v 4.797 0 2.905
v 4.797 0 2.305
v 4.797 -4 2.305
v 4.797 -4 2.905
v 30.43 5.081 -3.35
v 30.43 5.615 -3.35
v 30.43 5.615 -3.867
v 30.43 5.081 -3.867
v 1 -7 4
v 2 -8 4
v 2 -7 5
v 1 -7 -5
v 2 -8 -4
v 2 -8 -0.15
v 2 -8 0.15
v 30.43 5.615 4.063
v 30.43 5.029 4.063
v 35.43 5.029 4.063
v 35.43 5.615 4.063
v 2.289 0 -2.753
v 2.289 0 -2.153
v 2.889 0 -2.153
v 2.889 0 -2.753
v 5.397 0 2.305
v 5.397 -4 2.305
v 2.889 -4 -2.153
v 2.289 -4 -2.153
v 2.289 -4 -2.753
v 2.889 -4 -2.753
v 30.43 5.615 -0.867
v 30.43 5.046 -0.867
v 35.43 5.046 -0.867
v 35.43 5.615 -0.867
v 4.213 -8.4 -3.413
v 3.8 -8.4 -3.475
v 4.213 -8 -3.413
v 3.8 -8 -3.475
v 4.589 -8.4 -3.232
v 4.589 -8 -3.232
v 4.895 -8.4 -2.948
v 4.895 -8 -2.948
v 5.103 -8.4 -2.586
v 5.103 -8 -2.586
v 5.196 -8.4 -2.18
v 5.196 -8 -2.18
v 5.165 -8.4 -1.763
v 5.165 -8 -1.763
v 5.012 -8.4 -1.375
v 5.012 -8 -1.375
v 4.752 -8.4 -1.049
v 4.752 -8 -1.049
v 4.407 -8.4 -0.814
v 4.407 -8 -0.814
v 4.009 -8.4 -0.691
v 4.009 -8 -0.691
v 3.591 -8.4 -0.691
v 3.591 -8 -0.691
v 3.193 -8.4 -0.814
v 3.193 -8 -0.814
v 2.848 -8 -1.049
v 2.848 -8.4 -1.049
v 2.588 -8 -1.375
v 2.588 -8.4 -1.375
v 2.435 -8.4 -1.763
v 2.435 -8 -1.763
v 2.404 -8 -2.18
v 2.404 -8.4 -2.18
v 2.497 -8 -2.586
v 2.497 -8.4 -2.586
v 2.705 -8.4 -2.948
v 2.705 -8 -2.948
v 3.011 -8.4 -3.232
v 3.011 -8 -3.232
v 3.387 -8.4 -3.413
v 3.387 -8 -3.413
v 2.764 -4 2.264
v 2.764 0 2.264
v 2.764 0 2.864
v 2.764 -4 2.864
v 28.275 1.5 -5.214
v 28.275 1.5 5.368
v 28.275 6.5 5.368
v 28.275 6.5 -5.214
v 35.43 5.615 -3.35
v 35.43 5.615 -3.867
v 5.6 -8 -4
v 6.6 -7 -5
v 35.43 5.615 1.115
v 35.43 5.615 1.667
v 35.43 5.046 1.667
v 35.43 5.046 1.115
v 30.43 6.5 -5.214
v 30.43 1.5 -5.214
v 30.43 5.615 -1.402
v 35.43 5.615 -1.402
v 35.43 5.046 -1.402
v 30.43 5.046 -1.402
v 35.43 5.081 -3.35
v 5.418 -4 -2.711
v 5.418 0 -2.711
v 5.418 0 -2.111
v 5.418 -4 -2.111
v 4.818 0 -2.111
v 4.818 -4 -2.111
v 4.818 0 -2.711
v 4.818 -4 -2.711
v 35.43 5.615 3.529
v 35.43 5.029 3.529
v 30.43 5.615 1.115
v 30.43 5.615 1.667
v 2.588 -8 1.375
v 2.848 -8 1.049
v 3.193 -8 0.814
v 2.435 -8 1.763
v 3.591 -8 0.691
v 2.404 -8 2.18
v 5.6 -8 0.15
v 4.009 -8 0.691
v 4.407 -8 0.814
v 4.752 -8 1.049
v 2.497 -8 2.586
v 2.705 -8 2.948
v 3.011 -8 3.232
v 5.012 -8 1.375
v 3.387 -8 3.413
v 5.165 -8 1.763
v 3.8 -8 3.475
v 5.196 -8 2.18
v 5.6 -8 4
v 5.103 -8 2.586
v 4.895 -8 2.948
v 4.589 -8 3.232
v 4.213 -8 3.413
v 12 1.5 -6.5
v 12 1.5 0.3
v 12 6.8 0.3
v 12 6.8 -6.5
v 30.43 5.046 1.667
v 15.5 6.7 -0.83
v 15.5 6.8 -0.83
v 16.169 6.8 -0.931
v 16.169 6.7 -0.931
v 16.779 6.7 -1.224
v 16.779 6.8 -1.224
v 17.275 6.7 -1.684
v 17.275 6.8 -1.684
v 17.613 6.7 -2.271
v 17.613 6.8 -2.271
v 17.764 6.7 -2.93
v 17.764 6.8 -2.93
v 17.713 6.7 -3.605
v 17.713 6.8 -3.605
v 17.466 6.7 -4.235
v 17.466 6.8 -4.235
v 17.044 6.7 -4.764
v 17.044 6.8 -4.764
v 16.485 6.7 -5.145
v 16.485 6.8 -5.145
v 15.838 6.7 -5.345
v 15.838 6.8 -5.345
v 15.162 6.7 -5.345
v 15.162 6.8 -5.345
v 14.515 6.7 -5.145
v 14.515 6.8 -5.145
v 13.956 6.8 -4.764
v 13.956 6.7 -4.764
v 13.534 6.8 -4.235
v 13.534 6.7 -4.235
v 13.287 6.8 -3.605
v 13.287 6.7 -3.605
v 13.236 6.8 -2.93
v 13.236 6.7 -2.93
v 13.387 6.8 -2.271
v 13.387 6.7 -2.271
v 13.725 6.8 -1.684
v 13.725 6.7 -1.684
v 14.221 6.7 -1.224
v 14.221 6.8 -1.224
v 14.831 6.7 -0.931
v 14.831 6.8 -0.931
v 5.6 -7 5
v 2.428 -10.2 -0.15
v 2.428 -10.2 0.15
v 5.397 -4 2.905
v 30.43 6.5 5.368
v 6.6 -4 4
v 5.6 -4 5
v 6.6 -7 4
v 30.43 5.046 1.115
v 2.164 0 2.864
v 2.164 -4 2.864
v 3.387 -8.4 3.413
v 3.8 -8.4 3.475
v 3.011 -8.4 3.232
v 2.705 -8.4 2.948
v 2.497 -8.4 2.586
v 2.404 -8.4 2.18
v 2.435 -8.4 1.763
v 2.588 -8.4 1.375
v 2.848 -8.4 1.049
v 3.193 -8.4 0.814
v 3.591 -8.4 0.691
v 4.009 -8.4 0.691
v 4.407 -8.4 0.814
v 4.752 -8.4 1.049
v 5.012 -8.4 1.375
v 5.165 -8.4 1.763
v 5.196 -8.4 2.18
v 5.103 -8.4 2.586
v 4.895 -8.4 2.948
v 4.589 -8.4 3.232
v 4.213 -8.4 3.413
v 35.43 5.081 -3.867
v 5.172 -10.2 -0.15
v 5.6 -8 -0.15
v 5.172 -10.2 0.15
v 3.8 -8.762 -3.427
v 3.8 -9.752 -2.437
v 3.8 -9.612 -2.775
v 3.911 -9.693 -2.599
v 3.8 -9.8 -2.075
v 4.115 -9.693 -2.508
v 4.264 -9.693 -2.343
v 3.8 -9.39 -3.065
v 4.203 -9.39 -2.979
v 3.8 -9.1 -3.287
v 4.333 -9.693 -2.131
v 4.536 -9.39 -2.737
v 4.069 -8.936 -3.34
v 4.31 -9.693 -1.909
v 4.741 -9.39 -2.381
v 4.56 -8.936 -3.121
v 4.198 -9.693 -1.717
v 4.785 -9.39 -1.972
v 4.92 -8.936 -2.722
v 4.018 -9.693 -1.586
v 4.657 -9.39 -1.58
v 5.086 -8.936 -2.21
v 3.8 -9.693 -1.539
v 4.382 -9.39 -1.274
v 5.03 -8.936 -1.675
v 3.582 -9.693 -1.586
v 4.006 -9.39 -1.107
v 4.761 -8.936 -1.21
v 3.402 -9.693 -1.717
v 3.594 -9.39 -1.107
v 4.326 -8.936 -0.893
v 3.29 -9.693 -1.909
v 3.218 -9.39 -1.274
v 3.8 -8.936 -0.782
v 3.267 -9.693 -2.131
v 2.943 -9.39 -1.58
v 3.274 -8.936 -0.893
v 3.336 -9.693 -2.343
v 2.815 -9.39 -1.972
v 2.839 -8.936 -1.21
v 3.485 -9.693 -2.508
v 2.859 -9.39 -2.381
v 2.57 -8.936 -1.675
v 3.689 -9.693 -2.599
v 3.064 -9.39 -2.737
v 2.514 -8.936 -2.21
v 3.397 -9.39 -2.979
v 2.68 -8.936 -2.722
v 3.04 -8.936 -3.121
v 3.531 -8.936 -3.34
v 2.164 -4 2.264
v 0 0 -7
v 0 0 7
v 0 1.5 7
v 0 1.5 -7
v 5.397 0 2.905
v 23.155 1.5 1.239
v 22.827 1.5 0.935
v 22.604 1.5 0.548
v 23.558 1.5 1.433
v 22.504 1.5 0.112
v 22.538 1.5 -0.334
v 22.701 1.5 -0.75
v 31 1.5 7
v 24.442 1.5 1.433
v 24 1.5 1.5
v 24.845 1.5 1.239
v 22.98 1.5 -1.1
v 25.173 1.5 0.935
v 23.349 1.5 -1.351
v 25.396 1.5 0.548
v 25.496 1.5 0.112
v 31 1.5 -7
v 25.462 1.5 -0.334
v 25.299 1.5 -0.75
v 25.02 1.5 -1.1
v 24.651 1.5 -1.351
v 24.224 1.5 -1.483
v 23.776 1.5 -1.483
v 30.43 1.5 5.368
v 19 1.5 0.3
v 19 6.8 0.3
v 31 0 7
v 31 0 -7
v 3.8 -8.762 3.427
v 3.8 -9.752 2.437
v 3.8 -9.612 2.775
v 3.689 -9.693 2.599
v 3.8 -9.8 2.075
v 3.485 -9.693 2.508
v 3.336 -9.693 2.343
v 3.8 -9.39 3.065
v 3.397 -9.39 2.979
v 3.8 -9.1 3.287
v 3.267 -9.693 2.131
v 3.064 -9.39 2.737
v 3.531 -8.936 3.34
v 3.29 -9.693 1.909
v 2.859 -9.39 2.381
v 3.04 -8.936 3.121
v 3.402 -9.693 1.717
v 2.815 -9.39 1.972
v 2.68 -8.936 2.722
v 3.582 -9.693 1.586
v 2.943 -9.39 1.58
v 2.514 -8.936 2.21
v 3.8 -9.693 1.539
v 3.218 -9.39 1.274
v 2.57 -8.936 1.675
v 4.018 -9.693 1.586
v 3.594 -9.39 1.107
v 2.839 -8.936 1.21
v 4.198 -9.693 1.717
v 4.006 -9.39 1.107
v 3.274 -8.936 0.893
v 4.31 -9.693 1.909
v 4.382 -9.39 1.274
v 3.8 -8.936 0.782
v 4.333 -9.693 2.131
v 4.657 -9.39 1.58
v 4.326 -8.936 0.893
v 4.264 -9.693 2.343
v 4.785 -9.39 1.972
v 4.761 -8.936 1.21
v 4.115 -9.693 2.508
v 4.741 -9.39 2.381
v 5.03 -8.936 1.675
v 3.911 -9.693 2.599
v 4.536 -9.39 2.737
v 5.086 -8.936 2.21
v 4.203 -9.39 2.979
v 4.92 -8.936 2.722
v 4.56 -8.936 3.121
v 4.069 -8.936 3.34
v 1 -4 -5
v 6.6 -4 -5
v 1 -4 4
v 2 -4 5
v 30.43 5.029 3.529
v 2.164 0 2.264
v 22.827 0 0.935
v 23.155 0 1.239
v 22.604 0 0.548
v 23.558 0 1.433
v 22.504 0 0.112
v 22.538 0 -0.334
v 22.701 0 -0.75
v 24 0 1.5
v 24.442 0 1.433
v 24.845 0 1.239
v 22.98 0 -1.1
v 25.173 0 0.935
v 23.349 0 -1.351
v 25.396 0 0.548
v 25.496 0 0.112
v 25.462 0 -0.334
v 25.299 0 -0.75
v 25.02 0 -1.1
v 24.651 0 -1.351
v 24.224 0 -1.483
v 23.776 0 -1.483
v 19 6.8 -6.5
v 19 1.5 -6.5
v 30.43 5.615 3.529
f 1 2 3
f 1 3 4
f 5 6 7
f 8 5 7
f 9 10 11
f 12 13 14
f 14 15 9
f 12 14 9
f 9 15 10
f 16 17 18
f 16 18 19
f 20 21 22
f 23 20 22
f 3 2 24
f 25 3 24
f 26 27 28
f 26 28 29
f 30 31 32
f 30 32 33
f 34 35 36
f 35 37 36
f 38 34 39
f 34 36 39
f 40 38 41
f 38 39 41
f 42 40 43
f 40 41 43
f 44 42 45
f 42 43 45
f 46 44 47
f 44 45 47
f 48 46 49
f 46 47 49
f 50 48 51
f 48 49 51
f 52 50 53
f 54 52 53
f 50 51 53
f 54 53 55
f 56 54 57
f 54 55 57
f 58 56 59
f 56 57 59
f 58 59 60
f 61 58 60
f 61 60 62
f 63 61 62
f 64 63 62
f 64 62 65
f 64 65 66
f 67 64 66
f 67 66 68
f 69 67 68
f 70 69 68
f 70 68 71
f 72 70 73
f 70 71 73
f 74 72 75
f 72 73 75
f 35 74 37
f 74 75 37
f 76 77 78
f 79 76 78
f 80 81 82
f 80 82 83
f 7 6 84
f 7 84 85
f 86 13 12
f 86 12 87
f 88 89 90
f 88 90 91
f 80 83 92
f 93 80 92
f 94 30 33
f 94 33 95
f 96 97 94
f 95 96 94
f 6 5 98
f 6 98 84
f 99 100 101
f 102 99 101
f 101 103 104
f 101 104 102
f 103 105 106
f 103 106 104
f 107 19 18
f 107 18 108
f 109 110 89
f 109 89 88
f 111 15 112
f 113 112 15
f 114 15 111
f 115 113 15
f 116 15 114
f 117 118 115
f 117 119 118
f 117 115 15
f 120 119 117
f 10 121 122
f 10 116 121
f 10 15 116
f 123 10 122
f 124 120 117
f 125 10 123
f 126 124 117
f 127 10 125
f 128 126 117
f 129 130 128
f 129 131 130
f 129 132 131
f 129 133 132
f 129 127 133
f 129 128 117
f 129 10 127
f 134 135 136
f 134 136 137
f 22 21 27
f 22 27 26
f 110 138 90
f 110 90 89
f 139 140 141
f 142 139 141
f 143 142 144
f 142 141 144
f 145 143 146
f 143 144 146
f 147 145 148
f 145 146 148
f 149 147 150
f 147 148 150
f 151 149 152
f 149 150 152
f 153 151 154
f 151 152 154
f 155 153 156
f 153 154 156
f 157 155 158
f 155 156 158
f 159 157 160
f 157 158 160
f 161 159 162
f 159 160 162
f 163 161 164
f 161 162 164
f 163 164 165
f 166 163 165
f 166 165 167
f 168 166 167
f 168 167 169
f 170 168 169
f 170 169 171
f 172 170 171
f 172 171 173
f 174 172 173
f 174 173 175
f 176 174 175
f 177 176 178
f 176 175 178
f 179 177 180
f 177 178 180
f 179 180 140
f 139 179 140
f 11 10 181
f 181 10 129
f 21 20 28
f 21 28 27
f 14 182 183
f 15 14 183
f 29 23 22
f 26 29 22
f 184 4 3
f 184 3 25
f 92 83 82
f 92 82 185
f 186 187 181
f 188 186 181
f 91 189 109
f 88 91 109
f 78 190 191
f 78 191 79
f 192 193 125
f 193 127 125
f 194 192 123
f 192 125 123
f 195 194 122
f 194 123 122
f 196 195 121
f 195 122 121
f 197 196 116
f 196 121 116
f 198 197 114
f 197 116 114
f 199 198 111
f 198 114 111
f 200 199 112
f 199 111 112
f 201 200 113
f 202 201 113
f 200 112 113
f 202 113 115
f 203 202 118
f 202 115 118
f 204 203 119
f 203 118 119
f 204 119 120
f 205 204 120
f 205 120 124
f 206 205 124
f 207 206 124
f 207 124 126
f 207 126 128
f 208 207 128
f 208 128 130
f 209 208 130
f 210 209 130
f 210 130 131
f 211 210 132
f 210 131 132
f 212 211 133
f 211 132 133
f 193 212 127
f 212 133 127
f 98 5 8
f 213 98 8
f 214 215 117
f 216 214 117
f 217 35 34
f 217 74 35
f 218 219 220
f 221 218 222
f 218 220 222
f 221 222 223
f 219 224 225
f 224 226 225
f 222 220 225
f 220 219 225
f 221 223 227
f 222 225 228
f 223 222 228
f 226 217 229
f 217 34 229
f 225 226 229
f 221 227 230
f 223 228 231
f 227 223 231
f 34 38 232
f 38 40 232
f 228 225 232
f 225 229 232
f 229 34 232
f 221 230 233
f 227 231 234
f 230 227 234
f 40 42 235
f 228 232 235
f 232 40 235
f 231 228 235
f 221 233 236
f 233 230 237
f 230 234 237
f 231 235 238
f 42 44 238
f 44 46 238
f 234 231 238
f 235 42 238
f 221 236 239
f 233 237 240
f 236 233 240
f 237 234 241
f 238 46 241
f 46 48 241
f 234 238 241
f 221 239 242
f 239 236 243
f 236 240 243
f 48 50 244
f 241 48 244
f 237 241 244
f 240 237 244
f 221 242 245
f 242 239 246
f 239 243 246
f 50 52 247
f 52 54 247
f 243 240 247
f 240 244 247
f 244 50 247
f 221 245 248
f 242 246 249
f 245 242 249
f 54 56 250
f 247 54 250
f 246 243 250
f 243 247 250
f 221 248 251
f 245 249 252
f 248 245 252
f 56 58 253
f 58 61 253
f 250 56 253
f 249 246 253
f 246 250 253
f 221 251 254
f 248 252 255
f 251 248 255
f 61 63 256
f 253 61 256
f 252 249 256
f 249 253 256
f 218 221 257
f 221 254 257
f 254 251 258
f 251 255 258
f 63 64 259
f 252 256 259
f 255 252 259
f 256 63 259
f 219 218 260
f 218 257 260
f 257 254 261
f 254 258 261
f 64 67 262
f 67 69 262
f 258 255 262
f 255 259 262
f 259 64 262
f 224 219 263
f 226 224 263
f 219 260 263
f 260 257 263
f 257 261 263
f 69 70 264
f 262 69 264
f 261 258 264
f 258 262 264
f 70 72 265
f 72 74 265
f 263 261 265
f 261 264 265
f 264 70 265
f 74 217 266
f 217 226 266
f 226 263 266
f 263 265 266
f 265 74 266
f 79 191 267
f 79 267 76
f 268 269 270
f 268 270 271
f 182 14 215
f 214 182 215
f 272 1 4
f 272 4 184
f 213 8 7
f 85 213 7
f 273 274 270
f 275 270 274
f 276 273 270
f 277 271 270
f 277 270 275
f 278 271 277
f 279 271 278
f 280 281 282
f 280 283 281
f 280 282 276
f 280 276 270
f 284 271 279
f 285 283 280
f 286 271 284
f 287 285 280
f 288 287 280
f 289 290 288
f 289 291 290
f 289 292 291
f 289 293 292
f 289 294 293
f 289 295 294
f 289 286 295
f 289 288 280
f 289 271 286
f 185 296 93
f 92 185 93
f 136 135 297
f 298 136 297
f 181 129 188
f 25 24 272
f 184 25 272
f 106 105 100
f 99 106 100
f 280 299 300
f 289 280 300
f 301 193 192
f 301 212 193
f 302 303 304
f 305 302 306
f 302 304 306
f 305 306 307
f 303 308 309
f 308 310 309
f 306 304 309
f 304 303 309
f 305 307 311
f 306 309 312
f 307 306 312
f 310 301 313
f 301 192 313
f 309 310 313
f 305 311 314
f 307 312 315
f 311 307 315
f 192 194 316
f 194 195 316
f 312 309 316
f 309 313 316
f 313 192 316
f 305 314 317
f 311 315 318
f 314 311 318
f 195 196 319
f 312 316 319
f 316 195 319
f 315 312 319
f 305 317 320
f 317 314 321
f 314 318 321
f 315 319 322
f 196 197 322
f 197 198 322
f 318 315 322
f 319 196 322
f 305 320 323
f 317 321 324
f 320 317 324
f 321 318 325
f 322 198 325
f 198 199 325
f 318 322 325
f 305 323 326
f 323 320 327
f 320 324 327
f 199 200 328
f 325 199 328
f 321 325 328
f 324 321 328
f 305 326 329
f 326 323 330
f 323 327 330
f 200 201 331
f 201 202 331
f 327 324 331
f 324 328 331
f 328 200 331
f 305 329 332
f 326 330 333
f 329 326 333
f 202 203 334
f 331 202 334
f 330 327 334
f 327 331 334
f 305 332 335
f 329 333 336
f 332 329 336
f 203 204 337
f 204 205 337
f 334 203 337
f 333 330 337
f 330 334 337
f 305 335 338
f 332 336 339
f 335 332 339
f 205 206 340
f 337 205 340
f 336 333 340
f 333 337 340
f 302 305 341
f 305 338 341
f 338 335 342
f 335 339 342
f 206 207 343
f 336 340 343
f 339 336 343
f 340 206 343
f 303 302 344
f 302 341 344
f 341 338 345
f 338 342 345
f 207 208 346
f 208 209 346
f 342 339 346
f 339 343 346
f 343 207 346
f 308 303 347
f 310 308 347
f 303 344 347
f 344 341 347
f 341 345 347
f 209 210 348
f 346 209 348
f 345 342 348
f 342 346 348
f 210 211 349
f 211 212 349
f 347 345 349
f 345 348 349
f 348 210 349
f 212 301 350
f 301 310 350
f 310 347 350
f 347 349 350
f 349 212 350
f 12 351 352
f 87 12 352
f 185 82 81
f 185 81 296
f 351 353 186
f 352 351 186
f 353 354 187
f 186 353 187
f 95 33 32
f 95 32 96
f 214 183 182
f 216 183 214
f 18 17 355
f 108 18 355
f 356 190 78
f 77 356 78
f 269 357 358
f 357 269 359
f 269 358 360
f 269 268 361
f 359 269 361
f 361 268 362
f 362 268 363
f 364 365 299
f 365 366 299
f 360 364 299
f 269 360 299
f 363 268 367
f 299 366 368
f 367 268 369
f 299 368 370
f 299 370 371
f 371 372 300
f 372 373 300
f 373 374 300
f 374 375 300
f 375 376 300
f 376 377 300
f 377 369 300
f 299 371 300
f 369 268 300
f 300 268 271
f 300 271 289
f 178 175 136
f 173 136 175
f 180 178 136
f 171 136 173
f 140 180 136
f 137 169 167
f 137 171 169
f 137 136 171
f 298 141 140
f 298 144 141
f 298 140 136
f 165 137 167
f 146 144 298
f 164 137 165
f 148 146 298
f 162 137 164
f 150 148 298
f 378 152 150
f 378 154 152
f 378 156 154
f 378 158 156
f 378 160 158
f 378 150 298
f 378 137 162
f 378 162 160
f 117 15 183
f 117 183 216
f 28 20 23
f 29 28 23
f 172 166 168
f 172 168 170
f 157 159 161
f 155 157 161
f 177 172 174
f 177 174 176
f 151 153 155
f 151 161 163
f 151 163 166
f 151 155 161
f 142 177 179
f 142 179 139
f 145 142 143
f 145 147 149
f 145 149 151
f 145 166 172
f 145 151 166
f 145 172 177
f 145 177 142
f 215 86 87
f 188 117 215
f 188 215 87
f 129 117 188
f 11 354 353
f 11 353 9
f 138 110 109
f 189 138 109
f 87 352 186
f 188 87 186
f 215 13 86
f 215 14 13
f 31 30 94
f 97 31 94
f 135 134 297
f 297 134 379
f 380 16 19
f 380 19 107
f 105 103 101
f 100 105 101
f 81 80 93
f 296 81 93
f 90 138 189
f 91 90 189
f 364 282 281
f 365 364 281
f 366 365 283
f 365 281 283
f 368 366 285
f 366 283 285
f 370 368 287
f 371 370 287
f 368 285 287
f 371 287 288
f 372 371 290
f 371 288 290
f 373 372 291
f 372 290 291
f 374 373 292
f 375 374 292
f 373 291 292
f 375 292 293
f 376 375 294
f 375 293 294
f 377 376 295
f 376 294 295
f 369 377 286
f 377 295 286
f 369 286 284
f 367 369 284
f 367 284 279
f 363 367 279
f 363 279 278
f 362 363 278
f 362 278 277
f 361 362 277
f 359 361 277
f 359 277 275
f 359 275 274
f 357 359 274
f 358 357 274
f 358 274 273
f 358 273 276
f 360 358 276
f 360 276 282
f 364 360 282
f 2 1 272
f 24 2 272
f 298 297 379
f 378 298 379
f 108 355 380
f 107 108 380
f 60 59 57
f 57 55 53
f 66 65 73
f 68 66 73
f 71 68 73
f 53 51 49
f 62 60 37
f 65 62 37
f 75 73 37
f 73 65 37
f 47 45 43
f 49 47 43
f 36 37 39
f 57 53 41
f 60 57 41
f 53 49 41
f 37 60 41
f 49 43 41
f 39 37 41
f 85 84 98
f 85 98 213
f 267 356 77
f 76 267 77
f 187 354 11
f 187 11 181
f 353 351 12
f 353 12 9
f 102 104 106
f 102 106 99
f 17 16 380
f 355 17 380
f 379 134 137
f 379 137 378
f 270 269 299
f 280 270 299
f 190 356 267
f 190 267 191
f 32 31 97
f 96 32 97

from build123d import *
from OCP.BRepFilletAPI import BRepFilletAPI_MakeChamfer

# Parameters (mm, degrees)
SKETCH_1_W          = 31
SKETCH_1_H          = 14
EXTRUDE_1_DEPTH     = 1.5
SKETCH_2_W          = 7
SKETCH_2_H          = 6.8
EXTRUDE_2_DEPTH     = 5.3
SKETCH_3_W          = 2.154803144
SKETCH_3_H          = 10.581622582
EXTRUDE_3_DEPTH     = 5
SKETCH_5_W          = 0.534399799
SKETCH_5_H          = 0.586115909
EXTRUDE_4_DEPTH     = 5
SKETCH_5_W_2        = 0.551638502
SKETCH_5_H_2        = 0.568877205
EXTRUDE_4_2_DEPTH   = 5
EXTRUDE_4_3_DEPTH   = 5
SKETCH_5_W_3        = 0.517161096
SKETCH_5_H_3        = 0.534399799
EXTRUDE_4_4_DEPTH   = 5
EXTRUDE_START       = 4
SKETCH_6_W          = 5.6
SKETCH_6_H          = 10
EXTRUDE_5_DEPTH     = 4
EXTRUDE_6_REACH     = 38.99
SKETCH_7_W          = 0.6
SKETCH_7_H          = 0.6
CHAMFER_1_SIZE      = 1
SKETCH_8_R          = 1.5
CUT_EXTRUDE_1_DEPTH = 3
SKETCH_9_W          = 3.6
SKETCH_9_H          = 0.3
EXTRUDE_7_DEPTH     = 2.2
CHAMFER_2_SIZE      = 2.2
CHAMFER_2_SIZE_2    = 0.42763668
SKETCH_12_R         = 2.270300466
CUT_EXTRUDE_2_DEPTH = 0.1


with BuildPart() as part:
    # 草圖1 → 填料-伸長1 (new body)
    with BuildSketch(Plane(origin=(0, 0, 0), x_dir=(1, 0, 0), z_dir=(0, 1, 0))):
        with Locations((15.5, 0)):
            Rectangle(SKETCH_1_W, SKETCH_1_H)
    extrude(amount=EXTRUDE_1_DEPTH)

    # 草圖8 → 除料-伸長1 (cut)
    with BuildSketch(Plane(origin=(0, 1.5, 0), x_dir=(1, 0, 0), z_dir=(0, 1, 0))):
        with Locations(Location((24, 0, 0), (0, 0, 270))):
            Circle(SKETCH_8_R)
    extrude(amount=-CUT_EXTRUDE_1_DEPTH, mode=Mode.SUBTRACT)


with BuildPart() as body_2:
    # 草圖2 → 填料-伸長2 (new body)
    with BuildSketch(Plane(origin=(0, 1.5, 0), x_dir=(1, 0, 0), z_dir=(0, 1, 0))):
        with Locations((15.5, 3.1)):
            Rectangle(SKETCH_2_W, SKETCH_2_H)
    extrude(amount=EXTRUDE_2_DEPTH)

    # 草圖12 → 除料-伸長2 (cut)
    with BuildSketch(Plane(origin=(0, 6.8, 0), x_dir=(1, 0, 0), z_dir=(0, 1, 0))):
        with Locations(Location((15.5, 3.1, 0), (0, 0, 270))):
            Circle(SKETCH_12_R)
    extrude(amount=-CUT_EXTRUDE_2_DEPTH, mode=Mode.SUBTRACT)


with BuildPart() as body_3:
    # 草圖3 → 填料-伸長3 (new body)
    with BuildSketch(Plane(origin=(0, 1.5, 0), x_dir=(1, 0, 0), z_dir=(0, 1, 0))):
        with Locations((29.352305926, -0.076957255)):
            Rectangle(SKETCH_3_W, SKETCH_3_H)
    extrude(amount=EXTRUDE_3_DEPTH)


with BuildPart() as body_4:
    # 草圖5 → 填料-伸長4 (new body)
    with BuildSketch(Plane(origin=(30.429707498, 0, 0), x_dir=(0, 0, -1), z_dir=(1, 0, 0))):
        with Locations((-3.795796662, 5.3218671)):
            Rectangle(SKETCH_5_W, SKETCH_5_H)
    extrude(amount=EXTRUDE_4_DEPTH)


with BuildPart() as body_5:
    # 草圖5 → Extrude 4 2 (new body)
    with BuildSketch(Plane(origin=(30.429707498, 0, 0), x_dir=(0, 0, -1), z_dir=(1, 0, 0))):
        with Locations((-1.390997567, 5.330486452)):
            Rectangle(SKETCH_5_W_2, SKETCH_5_H_2)
    extrude(amount=EXTRUDE_4_2_DEPTH)


with BuildPart() as body_6:
    # 草圖5 → Extrude 4 3 (new body)
    with BuildSketch(Plane(origin=(30.429707498, 0, 0), x_dir=(0, 0, -1), z_dir=(1, 0, 0))):
        with Locations((1.134472451, 5.330486452)):
            Rectangle(SKETCH_5_W, SKETCH_5_H_2)
    extrude(amount=EXTRUDE_4_3_DEPTH)


with BuildPart() as body_7:
    # 草圖5 → Extrude 4 4 (new body)
    with BuildSketch(Plane(origin=(30.429707498, 0, 0), x_dir=(0, 0, -1), z_dir=(1, 0, 0))):
        with Locations((3.608226359, 5.347725155)):
            Rectangle(SKETCH_5_W_3, SKETCH_5_H_3)
    extrude(amount=EXTRUDE_4_4_DEPTH)


with BuildPart() as body_8:
    # 草圖6 → 填料-伸長5 (new body)
    with BuildSketch(Plane.XZ.offset(EXTRUDE_START)):
        with Locations((3.8, 0)):
            Rectangle(SKETCH_6_W, SKETCH_6_H)
    extrude(amount=EXTRUDE_5_DEPTH)


with BuildPart() as body_9:

    # 草圖7 → 填料-伸長6 (new, up to next)
    with BuildSketch(Plane.XZ, mode=Mode.PRIVATE) as extrude_6_sk1:
        with Locations((2.464305344, 2.563535255)):
            Rectangle(SKETCH_7_W, SKETCH_7_H)
    extrude_6_tool1 = extrude(extrude_6_sk1.sketch, amount=EXTRUDE_6_REACH, mode=Mode.PRIVATE) - body_8.part
    # 草圖7 → 填料-伸長6 (new, up to next)
    with BuildSketch(Plane.XZ, mode=Mode.PRIVATE) as extrude_6_sk2:
        with Locations((5.096791463, 2.604991729)):
            Rectangle(SKETCH_7_W, SKETCH_7_H)
    extrude_6_tool2 = extrude(extrude_6_sk2.sketch, amount=EXTRUDE_6_REACH, mode=Mode.PRIVATE) - body_8.part
    # 草圖7 → 填料-伸長6 (new, up to next)
    with BuildSketch(Plane.XZ, mode=Mode.PRIVATE) as extrude_6_sk3:
        with Locations((2.588674767, -2.452698138)):
            Rectangle(SKETCH_7_W, SKETCH_7_H)
    extrude_6_tool3 = extrude(extrude_6_sk3.sketch, amount=EXTRUDE_6_REACH, mode=Mode.PRIVATE) - body_8.part
    # 草圖7 → 填料-伸長6 (new, up to next)
    with BuildSketch(Plane.XZ, mode=Mode.PRIVATE) as extrude_6_sk4:
        with Locations((5.1175197, -2.411241663)):
            Rectangle(SKETCH_7_W, SKETCH_7_H)
    extrude_6_tool4 = extrude(extrude_6_sk4.sketch, amount=EXTRUDE_6_REACH, mode=Mode.PRIVATE) - body_8.part
    add(extrude_6_tool1.solids().sort_by_distance((2.464305, 0, 2.563535))[0])
    add(extrude_6_tool2.solids().sort_by_distance((5.096791, 0, 2.604992))[0])
    add(extrude_6_tool3.solids().sort_by_distance((2.588675, 0, -2.452698))[0])
    add(extrude_6_tool4.solids().sort_by_distance((5.11752, 0, -2.411242))[0])


with BuildPart() as body_8_1:
    add(body_8.part)

    # 導角1
    chamfer_1_edges = [body_8_1.edges().sort_by_distance(p)[0] for p in [
        (6.6, -8, 0),
        (3.8, -8, 5),
        (1, -8, 0),
        (3.8, -8, -5),
        (1, -6, 5),
        (6.6, -6, 5),
    ]]
    chamfer(chamfer_1_edges, length=CHAMFER_1_SIZE)

    # 草圖9 → 填料-伸長7 (add)
    with BuildSketch(Plane.XZ.offset(8)):
        with Locations((3.8, 0)):
            Rectangle(SKETCH_9_W, SKETCH_9_H)
    extrude(amount=EXTRUDE_7_DEPTH)

    # 導角2
    chamfer_2_edges_1 = [body_8_1.edges().sort_by_distance(p)[0] for p in [
        (5.6, -10.2, 0),
    ]]
    chamfer_2_side_1 = [body_8_1.faces().sort_by_distance(p)[0] for p in [
        (5.6, -10.191447266, 0),
    ]]
    chamfer_2_edges_2 = [body_8_1.edges().sort_by_distance(p)[0] for p in [
        (2, -10.2, 0),
    ]]
    chamfer_2_side_2 = [body_8_1.faces().sort_by_distance(p)[0] for p in [
        (2, -10.191447266, 0),
    ]]
    chamfer_2 = BRepFilletAPI_MakeChamfer(body_8_1.part.solid().wrapped)
    for e in chamfer_2_edges_1:
        chamfer_2.Add(CHAMFER_2_SIZE - 0.0001, CHAMFER_2_SIZE_2 - 0.0001, e.wrapped, chamfer_2_side_1[0].wrapped)
    for e in chamfer_2_edges_2:
        chamfer_2.Add(CHAMFER_2_SIZE - 0.0001, CHAMFER_2_SIZE_2 - 0.0001, e.wrapped, chamfer_2_side_2[0].wrapped)
    add(Compound.cast(chamfer_2.Shape()), mode=Mode.REPLACE)  # a hair under: the kernel refuses the full size

    # 草圖11 → 旋轉2 (revolve)
    with BuildSketch(Plane.ZY.offset(-3.8)):
        with BuildLine():
            Line((2.075, -8), (2.075, -9.8))
            ThreePointArc((2.075, -9.8), (3.064949494, -9.389949494), (3.475, -8.4))
            Line((3.475, -8.4), (3.475, -8))
            Line((3.475, -8), (2.075, -8))
        make_face()
    revolve(axis=Axis((3.8, -8, 2.075), (0, -1, 0)))


with BuildPart() as body_10:
    # 草圖10 → 旋轉1 (revolve)
    with BuildSketch(Plane.ZY.offset(-3.8)):
        with BuildLine():
            Line((-2.075, -8), (-2.075, -9.8))
            ThreePointArc((-2.075, -9.8), (-3.064949494, -9.389949494), (-3.475, -8.4))
            Line((-3.475, -8.4), (-3.475, -8))
            Line((-3.475, -8), (-2.075, -8))
        make_face()
    revolve(axis=Axis((3.8, -8, -2.075), (0, -1, 0)))


solid = Compound([part.part, body_2.part, body_3.part, body_4.part, body_5.part, body_6.part, body_7.part, body_9.part, body_8_1.part, body_10.part])
